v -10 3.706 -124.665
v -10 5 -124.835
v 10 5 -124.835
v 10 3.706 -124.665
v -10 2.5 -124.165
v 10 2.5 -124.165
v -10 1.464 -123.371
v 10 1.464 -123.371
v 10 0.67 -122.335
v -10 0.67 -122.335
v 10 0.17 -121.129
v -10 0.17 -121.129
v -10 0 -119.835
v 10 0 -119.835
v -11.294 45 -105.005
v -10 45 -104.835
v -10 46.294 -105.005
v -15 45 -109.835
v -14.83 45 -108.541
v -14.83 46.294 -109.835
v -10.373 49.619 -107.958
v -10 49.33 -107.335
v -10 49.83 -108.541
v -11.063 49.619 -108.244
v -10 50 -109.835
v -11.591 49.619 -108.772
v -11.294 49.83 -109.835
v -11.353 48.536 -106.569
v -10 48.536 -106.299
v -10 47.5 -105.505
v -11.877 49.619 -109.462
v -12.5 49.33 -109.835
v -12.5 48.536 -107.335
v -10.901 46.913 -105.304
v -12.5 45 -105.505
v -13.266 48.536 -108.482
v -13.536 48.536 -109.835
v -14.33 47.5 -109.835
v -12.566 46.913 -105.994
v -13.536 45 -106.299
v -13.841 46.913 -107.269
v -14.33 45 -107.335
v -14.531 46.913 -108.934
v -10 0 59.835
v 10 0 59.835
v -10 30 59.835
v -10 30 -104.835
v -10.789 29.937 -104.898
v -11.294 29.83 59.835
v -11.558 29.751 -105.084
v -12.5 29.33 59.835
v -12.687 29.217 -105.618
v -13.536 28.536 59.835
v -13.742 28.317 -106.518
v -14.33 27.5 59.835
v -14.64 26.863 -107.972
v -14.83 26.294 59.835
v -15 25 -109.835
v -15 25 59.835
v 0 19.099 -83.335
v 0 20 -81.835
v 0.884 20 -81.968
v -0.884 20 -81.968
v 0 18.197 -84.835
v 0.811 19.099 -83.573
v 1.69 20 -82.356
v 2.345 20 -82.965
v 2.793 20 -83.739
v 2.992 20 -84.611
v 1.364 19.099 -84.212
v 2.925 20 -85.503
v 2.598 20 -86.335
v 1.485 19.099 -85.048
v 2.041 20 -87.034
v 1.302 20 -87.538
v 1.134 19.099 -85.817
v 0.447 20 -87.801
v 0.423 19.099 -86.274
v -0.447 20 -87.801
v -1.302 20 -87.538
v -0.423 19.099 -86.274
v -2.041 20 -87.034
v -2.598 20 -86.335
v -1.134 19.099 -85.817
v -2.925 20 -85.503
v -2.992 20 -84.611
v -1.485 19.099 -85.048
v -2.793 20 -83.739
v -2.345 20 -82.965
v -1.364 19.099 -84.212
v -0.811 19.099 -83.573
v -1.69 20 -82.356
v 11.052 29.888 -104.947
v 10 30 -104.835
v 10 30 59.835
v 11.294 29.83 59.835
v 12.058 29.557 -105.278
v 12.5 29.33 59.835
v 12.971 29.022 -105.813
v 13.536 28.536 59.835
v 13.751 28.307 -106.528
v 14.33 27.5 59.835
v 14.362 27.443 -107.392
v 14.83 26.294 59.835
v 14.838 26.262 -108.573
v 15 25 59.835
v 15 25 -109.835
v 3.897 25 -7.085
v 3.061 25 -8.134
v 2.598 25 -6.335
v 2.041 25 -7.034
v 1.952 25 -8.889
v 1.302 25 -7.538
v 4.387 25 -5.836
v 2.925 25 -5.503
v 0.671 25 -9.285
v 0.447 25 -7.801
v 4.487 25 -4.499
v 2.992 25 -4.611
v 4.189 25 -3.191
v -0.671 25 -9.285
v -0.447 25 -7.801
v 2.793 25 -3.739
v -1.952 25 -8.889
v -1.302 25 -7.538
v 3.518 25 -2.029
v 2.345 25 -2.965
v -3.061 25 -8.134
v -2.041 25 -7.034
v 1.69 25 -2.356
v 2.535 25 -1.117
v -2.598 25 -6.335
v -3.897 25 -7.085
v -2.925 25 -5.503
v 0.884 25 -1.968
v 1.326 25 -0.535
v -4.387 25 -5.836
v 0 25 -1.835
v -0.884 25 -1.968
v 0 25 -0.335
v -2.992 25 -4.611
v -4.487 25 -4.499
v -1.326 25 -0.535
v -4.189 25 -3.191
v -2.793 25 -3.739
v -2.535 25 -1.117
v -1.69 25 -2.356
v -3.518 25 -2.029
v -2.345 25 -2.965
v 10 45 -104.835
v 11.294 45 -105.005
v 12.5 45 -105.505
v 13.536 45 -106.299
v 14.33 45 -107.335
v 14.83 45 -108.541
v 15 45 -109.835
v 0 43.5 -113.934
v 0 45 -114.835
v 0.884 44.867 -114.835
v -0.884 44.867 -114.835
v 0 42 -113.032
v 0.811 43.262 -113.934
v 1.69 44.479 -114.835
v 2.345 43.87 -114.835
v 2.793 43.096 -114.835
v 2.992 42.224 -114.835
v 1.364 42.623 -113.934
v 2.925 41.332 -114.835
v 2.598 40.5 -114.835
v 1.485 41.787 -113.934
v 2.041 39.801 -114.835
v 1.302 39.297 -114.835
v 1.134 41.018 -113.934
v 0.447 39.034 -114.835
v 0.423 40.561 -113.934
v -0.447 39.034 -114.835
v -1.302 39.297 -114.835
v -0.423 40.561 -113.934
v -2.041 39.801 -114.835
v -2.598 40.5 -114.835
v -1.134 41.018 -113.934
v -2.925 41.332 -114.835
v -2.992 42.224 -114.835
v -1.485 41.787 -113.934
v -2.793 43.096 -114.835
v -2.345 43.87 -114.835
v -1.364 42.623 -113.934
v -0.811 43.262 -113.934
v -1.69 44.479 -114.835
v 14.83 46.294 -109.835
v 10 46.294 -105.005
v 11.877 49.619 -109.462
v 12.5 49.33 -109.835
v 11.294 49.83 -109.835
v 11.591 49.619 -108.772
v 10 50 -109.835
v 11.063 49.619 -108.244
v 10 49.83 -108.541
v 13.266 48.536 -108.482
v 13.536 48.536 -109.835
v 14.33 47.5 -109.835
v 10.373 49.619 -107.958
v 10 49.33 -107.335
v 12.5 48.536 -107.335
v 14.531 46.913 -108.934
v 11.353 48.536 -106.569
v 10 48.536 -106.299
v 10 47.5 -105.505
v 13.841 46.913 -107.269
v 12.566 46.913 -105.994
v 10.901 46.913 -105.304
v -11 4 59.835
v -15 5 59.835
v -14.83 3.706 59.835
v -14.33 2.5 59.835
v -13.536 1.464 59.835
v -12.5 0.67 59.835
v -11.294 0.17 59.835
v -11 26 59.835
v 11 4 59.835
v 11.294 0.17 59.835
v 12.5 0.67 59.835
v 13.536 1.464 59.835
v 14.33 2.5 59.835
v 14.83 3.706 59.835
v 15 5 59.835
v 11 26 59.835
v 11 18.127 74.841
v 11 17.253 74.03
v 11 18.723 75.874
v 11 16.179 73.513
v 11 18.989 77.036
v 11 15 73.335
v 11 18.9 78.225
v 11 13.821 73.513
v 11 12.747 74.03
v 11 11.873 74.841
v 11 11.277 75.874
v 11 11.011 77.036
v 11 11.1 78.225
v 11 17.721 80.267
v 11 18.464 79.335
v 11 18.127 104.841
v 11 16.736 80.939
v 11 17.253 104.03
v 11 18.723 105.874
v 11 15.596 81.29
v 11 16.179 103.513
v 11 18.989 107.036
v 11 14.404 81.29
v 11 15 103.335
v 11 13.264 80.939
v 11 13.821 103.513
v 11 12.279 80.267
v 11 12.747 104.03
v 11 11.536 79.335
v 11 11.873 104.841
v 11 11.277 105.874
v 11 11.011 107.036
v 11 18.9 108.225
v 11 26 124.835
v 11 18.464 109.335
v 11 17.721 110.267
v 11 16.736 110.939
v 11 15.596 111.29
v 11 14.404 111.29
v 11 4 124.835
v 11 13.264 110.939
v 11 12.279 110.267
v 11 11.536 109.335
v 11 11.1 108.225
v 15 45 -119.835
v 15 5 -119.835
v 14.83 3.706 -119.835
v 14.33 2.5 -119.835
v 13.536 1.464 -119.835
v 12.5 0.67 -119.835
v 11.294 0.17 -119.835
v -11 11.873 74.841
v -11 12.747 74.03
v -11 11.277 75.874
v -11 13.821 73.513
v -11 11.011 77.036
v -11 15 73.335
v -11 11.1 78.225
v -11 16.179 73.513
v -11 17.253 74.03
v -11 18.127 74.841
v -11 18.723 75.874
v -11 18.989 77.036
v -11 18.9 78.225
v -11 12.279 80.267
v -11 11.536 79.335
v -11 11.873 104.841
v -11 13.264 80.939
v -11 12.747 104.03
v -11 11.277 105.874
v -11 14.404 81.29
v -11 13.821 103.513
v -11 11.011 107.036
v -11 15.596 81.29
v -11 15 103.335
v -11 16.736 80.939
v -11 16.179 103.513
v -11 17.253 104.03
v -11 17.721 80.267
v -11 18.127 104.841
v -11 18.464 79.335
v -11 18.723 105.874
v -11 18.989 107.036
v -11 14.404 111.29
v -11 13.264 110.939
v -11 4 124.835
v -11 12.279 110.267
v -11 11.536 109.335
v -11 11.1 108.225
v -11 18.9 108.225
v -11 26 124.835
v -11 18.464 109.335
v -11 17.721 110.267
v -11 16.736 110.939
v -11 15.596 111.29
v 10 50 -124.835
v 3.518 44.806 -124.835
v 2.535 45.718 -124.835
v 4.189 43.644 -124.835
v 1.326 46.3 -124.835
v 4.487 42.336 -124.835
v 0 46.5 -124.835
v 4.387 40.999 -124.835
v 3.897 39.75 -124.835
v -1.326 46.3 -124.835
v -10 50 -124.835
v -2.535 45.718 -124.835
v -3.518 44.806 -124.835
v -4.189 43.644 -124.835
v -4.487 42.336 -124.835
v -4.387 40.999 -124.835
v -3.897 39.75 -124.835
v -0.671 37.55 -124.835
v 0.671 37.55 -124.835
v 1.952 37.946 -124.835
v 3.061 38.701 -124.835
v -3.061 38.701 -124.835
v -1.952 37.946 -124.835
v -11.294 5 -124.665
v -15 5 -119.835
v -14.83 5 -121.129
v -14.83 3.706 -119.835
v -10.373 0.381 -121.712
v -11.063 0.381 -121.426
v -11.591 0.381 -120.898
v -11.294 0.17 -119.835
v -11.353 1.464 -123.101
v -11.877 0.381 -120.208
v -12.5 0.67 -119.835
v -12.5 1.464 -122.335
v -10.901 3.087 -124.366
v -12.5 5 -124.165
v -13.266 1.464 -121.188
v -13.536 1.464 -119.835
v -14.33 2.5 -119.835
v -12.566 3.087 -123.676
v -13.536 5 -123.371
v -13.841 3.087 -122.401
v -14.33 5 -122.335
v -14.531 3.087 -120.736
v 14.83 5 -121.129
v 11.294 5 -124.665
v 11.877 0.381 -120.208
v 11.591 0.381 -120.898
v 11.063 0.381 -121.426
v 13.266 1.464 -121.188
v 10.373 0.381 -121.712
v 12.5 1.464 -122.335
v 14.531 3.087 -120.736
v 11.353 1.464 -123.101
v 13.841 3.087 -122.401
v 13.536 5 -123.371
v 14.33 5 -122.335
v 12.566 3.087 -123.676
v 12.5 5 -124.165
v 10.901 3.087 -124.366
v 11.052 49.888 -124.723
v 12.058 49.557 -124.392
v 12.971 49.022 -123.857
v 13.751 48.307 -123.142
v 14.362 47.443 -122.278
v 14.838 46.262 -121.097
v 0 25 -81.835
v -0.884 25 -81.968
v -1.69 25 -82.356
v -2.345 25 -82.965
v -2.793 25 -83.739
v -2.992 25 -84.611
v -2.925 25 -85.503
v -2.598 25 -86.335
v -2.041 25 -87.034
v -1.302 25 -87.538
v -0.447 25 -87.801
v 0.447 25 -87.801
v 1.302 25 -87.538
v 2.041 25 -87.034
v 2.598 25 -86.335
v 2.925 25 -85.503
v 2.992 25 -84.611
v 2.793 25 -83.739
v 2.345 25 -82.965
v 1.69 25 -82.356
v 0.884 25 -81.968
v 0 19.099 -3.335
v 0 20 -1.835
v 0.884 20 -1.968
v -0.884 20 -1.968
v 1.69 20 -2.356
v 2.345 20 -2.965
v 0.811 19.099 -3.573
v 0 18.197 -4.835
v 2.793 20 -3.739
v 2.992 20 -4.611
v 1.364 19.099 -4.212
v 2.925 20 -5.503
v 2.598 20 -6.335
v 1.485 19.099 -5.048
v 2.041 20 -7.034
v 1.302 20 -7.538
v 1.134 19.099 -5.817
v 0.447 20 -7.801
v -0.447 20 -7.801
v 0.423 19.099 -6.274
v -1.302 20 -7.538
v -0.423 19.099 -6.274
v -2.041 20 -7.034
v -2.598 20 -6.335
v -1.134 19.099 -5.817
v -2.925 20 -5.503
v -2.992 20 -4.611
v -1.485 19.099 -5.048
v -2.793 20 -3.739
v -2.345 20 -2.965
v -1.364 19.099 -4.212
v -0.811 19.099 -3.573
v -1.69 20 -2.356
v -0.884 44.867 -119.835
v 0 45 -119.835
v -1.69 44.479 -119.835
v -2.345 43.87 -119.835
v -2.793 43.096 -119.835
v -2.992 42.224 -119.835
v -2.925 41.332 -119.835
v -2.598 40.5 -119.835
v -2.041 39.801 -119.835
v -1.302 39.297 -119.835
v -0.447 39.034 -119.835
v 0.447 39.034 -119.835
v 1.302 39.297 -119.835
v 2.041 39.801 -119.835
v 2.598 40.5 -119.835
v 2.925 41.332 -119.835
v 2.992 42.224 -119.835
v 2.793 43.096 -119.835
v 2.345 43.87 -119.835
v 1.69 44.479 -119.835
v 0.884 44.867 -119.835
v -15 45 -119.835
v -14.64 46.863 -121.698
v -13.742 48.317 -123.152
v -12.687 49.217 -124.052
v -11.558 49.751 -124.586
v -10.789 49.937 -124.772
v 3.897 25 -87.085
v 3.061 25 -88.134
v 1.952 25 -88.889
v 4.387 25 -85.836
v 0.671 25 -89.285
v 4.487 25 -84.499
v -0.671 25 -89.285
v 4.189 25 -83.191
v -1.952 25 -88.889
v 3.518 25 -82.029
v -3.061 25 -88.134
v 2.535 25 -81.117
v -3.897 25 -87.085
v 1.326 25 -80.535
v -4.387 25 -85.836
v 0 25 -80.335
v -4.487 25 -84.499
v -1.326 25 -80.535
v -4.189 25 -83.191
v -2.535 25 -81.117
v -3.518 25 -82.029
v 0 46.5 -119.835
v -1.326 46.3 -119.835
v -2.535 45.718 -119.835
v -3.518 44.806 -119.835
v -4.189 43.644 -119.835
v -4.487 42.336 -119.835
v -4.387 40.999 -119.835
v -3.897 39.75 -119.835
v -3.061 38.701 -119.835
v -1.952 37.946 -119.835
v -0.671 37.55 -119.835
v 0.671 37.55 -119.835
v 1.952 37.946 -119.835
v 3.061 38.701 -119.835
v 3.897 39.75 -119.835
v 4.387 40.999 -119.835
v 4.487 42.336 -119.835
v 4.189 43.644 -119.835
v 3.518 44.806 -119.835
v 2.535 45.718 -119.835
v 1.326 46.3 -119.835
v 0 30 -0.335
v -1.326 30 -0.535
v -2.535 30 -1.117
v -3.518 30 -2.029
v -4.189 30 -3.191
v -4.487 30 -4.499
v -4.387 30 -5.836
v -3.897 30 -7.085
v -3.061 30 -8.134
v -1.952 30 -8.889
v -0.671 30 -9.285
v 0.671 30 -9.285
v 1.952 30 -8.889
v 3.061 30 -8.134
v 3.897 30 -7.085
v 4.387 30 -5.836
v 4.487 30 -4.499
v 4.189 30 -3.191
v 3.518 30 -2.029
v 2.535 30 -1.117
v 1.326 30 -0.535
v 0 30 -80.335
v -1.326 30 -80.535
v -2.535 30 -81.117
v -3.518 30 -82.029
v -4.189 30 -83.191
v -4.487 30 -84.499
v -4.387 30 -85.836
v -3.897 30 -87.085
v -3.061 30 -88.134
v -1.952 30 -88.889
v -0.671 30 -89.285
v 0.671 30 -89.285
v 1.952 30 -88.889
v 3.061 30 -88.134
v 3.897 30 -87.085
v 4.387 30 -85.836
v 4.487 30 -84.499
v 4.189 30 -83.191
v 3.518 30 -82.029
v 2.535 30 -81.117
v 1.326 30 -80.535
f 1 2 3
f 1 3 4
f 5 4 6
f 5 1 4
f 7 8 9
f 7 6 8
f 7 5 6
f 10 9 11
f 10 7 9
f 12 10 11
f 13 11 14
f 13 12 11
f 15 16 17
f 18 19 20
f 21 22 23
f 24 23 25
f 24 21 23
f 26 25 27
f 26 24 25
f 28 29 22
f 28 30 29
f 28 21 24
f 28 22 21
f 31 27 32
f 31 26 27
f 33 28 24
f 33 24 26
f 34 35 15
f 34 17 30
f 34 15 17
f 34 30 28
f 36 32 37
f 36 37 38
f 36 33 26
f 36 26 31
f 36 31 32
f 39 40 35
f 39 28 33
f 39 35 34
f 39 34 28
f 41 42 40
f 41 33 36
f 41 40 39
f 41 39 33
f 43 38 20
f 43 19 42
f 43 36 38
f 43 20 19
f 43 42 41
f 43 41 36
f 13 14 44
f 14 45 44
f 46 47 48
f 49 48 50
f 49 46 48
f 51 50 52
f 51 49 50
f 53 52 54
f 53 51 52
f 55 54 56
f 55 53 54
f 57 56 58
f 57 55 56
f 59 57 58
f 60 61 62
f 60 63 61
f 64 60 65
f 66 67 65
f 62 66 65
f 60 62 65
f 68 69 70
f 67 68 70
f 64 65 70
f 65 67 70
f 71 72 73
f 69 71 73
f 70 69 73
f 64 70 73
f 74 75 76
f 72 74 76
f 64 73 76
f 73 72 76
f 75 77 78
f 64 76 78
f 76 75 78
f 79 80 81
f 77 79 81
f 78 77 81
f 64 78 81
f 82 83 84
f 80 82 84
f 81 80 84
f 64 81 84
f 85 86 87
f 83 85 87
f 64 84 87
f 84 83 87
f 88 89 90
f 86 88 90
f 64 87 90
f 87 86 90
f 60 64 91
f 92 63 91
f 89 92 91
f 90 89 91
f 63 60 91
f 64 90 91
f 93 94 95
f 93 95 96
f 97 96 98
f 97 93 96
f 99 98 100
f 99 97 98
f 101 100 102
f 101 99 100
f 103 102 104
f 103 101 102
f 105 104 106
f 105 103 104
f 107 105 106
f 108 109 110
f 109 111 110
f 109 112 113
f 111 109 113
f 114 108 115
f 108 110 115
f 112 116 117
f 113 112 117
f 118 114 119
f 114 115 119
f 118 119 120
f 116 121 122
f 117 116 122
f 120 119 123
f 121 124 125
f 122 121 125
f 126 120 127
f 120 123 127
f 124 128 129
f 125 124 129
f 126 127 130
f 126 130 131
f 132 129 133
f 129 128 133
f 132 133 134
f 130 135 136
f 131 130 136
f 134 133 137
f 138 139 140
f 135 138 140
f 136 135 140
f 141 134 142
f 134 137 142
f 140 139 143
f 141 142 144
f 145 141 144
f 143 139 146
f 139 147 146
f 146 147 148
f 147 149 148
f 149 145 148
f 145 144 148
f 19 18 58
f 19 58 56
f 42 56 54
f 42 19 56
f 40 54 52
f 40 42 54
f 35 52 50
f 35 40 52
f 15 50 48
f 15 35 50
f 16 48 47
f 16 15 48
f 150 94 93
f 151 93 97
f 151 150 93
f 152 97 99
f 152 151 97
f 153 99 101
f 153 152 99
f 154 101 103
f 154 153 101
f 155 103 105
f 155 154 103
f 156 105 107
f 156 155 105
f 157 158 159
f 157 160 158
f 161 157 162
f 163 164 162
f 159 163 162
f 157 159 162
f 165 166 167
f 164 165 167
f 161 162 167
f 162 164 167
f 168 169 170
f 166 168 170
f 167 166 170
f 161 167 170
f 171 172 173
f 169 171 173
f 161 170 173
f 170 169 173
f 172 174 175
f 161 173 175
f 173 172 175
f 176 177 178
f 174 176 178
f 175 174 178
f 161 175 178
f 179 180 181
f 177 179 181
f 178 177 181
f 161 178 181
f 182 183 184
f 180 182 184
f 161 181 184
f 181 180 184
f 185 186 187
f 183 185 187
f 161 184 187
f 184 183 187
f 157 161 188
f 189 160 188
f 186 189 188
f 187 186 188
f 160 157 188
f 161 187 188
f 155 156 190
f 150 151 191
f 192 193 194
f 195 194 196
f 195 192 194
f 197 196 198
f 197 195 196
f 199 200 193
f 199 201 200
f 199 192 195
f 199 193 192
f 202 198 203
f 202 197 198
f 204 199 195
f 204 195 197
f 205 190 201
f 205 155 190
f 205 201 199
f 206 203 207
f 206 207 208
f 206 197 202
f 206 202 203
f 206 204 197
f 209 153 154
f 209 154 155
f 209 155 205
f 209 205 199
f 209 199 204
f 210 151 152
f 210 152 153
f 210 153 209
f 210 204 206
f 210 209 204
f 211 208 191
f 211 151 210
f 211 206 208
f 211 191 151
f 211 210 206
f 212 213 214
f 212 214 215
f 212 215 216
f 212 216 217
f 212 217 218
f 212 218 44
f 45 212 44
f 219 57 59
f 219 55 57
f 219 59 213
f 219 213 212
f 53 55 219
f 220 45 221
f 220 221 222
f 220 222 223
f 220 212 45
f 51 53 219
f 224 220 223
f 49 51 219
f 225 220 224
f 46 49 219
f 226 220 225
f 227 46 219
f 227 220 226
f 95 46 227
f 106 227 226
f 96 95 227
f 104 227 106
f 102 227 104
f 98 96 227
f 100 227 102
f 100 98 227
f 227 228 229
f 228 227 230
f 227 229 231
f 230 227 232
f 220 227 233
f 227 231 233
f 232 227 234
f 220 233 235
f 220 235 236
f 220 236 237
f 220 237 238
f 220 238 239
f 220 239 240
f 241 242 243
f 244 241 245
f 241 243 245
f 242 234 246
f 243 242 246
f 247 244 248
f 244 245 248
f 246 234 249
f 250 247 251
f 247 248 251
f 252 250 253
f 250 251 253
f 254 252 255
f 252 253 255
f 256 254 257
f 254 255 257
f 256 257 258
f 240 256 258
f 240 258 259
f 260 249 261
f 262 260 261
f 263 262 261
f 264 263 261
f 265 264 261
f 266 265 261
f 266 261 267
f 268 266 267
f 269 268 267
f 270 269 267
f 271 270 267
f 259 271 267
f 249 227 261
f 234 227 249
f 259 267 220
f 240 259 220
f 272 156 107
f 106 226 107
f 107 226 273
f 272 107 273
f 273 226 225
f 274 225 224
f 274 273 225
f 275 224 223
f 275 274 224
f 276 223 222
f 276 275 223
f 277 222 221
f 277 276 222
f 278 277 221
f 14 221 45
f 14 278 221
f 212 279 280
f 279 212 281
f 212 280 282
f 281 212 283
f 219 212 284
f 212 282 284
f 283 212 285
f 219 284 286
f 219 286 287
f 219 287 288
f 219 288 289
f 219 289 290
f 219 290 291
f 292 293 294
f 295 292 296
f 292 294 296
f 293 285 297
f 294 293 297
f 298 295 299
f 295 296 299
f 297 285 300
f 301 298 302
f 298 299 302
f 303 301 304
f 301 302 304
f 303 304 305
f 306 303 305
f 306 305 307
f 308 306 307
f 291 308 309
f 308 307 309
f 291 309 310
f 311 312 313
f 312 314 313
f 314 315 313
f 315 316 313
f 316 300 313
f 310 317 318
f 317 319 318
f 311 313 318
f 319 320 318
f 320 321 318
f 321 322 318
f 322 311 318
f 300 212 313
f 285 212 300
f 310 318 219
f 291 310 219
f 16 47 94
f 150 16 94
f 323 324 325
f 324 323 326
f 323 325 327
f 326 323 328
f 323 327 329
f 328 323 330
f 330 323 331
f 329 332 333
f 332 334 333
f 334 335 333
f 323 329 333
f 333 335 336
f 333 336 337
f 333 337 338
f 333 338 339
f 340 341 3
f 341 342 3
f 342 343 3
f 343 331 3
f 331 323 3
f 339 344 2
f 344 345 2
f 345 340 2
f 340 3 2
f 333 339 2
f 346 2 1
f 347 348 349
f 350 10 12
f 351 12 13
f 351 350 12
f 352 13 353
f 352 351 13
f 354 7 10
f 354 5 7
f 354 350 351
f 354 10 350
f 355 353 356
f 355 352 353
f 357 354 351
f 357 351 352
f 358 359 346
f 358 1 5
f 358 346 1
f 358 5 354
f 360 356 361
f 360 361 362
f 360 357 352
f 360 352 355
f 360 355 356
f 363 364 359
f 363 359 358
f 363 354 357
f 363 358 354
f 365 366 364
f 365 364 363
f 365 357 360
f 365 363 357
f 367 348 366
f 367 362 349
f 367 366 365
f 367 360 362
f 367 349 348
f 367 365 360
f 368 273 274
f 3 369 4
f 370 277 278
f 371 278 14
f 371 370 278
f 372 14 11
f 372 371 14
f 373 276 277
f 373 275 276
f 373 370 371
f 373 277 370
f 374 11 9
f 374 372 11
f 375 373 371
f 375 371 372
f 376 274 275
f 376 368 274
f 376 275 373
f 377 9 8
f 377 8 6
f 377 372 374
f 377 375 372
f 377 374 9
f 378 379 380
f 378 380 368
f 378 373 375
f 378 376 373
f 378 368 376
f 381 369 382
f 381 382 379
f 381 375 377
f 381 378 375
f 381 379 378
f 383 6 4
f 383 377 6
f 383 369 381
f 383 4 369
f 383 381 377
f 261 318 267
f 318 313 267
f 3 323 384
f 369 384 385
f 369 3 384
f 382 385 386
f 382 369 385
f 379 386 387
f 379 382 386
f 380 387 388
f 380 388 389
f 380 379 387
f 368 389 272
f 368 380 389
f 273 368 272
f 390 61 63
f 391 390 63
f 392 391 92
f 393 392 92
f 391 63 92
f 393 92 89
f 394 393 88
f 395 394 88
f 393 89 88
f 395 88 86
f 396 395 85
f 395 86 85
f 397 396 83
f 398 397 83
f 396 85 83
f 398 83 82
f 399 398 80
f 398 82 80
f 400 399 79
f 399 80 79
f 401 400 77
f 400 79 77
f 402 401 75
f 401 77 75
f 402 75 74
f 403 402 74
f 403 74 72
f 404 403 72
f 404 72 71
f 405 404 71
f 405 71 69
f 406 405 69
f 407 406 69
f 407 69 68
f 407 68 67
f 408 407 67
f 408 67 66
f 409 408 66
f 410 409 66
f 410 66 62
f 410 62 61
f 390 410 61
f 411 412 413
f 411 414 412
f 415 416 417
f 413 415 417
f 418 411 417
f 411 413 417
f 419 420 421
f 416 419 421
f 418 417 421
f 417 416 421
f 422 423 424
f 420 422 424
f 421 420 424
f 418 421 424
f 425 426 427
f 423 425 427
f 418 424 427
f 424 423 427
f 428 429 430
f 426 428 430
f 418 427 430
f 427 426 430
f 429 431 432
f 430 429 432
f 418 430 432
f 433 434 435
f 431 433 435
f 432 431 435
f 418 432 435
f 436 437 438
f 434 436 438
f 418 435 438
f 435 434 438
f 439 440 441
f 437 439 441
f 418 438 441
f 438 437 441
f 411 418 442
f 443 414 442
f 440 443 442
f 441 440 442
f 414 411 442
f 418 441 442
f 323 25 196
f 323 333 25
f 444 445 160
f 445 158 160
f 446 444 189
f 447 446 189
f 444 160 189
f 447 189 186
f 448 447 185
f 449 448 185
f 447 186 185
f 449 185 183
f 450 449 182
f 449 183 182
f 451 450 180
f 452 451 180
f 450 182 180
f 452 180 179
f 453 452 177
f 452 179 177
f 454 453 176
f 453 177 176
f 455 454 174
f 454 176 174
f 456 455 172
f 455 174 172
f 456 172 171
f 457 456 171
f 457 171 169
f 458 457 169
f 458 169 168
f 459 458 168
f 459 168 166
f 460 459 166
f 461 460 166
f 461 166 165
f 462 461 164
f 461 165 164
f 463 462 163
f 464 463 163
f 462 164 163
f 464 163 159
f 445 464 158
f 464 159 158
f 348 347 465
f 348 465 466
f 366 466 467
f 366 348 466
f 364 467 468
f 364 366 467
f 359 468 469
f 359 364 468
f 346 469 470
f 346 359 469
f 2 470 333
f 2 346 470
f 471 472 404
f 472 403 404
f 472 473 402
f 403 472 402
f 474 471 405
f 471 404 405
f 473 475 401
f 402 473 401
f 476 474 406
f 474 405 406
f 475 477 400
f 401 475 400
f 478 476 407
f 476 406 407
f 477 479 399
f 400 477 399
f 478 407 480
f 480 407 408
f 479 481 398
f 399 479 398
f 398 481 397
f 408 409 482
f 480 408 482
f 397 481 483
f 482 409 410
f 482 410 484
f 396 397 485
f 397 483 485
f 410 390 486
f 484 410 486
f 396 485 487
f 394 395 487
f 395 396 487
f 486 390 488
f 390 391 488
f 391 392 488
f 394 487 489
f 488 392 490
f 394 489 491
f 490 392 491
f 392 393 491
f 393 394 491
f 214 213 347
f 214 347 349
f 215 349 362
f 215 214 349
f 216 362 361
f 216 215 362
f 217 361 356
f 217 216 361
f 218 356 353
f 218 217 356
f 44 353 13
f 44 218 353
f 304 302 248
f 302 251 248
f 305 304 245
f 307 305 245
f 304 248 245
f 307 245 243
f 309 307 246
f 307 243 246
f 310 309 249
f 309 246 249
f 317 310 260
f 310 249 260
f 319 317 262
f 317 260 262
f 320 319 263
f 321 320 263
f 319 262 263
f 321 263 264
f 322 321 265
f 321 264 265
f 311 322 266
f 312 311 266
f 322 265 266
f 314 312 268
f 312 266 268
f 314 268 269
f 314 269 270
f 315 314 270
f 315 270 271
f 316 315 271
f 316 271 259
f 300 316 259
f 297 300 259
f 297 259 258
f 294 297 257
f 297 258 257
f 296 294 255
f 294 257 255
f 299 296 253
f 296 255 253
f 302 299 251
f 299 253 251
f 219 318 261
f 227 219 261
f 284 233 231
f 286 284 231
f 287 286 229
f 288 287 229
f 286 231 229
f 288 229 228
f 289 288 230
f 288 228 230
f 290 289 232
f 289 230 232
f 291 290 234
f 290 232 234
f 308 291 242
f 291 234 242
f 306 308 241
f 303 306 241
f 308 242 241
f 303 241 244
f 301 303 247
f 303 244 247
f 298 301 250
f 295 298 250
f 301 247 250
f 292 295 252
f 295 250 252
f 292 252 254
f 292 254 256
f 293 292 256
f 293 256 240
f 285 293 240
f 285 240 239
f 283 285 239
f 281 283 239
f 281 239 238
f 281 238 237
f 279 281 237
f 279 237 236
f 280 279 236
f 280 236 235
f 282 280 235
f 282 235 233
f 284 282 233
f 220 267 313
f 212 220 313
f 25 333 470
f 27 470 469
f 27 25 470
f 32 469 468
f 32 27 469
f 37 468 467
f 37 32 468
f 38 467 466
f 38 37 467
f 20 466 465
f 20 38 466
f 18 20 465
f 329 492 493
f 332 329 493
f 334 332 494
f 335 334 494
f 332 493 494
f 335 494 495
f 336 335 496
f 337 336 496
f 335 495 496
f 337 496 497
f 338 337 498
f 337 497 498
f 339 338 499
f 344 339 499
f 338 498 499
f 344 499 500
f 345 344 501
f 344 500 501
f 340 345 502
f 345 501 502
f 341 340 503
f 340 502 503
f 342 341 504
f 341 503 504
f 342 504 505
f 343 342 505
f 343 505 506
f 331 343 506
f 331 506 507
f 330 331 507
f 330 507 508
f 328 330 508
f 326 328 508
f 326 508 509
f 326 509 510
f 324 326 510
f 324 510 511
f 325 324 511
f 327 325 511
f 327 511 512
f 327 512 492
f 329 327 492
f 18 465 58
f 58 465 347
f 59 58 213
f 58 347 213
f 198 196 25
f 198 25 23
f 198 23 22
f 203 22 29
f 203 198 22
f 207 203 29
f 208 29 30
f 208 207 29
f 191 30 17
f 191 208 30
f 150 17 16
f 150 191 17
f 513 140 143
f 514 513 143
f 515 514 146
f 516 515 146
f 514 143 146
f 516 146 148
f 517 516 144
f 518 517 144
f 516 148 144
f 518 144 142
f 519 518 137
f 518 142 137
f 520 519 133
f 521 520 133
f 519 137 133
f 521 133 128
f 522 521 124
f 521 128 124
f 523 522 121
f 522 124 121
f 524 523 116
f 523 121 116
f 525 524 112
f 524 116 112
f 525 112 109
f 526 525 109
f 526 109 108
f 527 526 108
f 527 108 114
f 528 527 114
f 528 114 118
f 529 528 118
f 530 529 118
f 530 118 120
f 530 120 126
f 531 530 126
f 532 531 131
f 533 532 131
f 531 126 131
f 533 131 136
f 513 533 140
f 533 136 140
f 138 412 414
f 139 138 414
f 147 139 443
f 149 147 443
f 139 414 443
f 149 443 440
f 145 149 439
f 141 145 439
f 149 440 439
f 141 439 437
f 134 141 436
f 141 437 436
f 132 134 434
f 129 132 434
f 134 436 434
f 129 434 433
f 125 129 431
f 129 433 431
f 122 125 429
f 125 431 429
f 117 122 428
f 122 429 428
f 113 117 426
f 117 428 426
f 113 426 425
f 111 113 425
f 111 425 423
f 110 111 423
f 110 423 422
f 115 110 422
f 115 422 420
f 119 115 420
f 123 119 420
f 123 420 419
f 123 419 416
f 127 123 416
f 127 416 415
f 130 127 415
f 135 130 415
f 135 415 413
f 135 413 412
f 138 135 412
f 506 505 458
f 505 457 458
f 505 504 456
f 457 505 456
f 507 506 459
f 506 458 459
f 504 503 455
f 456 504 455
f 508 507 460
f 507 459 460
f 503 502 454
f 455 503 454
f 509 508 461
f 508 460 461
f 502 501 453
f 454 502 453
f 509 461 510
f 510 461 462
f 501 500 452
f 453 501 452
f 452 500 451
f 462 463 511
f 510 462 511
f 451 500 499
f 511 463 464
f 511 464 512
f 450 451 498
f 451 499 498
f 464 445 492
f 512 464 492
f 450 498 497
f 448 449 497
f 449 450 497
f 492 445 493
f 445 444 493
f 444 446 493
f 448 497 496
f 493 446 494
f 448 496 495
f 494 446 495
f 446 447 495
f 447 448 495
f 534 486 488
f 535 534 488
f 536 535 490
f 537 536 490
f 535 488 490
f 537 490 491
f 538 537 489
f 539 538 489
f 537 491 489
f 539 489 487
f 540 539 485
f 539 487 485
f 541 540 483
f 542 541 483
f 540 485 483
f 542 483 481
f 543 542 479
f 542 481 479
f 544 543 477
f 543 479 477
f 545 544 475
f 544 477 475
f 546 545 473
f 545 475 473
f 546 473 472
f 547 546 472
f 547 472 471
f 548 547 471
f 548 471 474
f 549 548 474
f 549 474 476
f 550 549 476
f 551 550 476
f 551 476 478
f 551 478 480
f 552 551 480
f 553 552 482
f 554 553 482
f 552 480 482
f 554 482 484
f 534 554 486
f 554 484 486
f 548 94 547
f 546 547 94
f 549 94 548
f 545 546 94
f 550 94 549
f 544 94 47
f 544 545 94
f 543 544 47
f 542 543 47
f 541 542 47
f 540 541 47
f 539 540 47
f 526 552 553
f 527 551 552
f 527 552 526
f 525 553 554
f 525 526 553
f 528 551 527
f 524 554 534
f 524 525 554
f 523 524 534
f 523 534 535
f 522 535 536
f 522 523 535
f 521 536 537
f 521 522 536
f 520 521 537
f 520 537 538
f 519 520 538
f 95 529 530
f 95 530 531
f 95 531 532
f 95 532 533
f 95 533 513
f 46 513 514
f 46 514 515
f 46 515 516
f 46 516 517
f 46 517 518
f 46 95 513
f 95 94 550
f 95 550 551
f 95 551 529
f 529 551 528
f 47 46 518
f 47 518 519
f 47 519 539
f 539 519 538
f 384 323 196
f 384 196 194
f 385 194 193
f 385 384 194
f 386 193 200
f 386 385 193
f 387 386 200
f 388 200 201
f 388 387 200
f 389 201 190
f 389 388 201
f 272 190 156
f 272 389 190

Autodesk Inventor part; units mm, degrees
ref_plane "YZ Plane" through (0, 0, 0) normal (1, 0, 0) x (0, 1, 0)
ref_plane "XZ Plane" through (0, 0, 0) normal (0, 1, 0) x (-1, 0, 0)
ref_plane "XY Plane" through (0, 0, 0) normal (0, 0, 1) x (1, 0, 0)
sketch "Sketch1" plane through (0, 0, 0) normal (0, 1, 0) x (-1, 0, 0)
  line L0 (15, 124.835) -> (-15, 124.835)
  line L1 (-15, 124.835) -> (-15, -124.835)
  line L2 (-15, -124.835) -> (15, -124.835)
  line L3 (15, -124.835) -> (15, 124.835)
  line L4 (15, 124.835) -> (-15, -124.835) construction
  line L5 (-15, 124.835) -> (15, -124.835) construction
  point P0 (0, 0)
  dimension "d0" = 30
  dimension "d1" = 249.67
extrude "Extrusion1" add sketch "Sketch1" along normal blind 30
sketch "Sketch2" plane through (0, 30, 0) normal (0, 1, 0) x (1, 0, 0)
  line L0 (15, 124.835) -> (-15, 124.835) projected
  line L1 (-15, 124.835) -> (-15, -124.835) projected
  line L2 (15, 124.835) -> (-15, 124.835)
  line L3 (-15, 124.835) -> (-15, 104.835)
  line L4 (-15, 104.835) -> (15, 104.835)
  line L5 (15, 104.835) -> (15, 124.835)
  point P0 (0, 0)
  dimension "d4" = 20
extrude "Extrusion2" add sketch "Sketch2" along normal blind 20
sketch "Sketch3" plane through (-15, 0, 124.835) normal (0, 0, 1) x (1, 0, 0)
  line L0 (0, 0) -> (30, 0) projected
  line L1 (30, 0) -> (30, 30) projected
  line L2 (0, 30) -> (30, 30) projected
  line L3 (0, 0) -> (0, 30) projected
  line L4 (4, 26) -> (26, 26)
  line L5 (26, 26) -> (26, 4)
  line L6 (26, 4) -> (4, 4)
  line L7 (4, 4) -> (4, 26)
  point P0 (15, 0)
  dimension "d7" = 4
extrude "Extrusion3" cut sketch "Sketch3" against normal blind 65
sketch "Sketch4" plane through (15, 0, -124.835) normal (0, 0, -1) x (-1, 0, 0)
  line L0 (0, 50) -> (30, 50) projected
  line L1 (30, 0) -> (30, 50) projected
  point P0 (15, 0)
  point P1 (15, 42)
  dimension "d10" = 8
  dimension "d11" = 15
hole "Hole1" at (0, 42, -124.835) direction (0, 0, 1) diameter 6 depth 10 tip angle 118 counterbore diameter 9 counterbore depth 5
sketch "Sketch5" plane through (11, 4, 124.835) normal (1, 0, 0) x (0, 0, -1)
  circle A0 centre (17.5, 11) radius 4
  circle A1 centre (47.5, 11) radius 4
  line L0 (65, 26) -> (65, -4) projected
  line L1 (0, 0) -> (0, 22) projected
  line L2 (0, 0) -> (65, 0) projected
  point P0 (124.835, -4)
  point P1 (65, 11)
  point P2 (0, 11)
  dimension "d19" = 8
  dimension "d20" = 8
  dimension "d21" = 30
  dimension "d23" = 17.5
extrude "Extrusion4" cut sketch "Sketch5" against normal through all
fillet "Fillet1" radius 5 12 edges at (15, 25, -124.835) (-15, 25, -124.835) (0, 0, -124.835) (15, 0, -32.5) (-15, 0, -32.5) (15, 30, -22.5) (-15, 30, -22.5) (15, 40, -104.835) (-15, 40, -104.835) (0, 50, -104.835) (15, 50, -114.835) (-15, 50, -114.835)
sketch "Sketch6" plane through (0, 30, 0) normal (0, 1, 0) x (1, 0, 0)
  line L0 (-10, 104.835) -> (10, 104.835) projected
  line L1 (-10, -59.835) -> (-10, 104.835) projected
  point P0 (0, 0)
  point P1 (0, 84.835)
  point P2 (0, 4.835)
  dimension "d28" = 20
  dimension "d36" = 100
  dimension "d37" = 10
  dimension "d38" = 10
hole "Hole2" at (0, 30, -4.835) at (0, 30, -84.835) direction (0, -1, 0) diameter 6 depth 10 tip angle 118 counterbore diameter 9 counterbore depth 5
properties part number "L" material "PCTG 20%"
